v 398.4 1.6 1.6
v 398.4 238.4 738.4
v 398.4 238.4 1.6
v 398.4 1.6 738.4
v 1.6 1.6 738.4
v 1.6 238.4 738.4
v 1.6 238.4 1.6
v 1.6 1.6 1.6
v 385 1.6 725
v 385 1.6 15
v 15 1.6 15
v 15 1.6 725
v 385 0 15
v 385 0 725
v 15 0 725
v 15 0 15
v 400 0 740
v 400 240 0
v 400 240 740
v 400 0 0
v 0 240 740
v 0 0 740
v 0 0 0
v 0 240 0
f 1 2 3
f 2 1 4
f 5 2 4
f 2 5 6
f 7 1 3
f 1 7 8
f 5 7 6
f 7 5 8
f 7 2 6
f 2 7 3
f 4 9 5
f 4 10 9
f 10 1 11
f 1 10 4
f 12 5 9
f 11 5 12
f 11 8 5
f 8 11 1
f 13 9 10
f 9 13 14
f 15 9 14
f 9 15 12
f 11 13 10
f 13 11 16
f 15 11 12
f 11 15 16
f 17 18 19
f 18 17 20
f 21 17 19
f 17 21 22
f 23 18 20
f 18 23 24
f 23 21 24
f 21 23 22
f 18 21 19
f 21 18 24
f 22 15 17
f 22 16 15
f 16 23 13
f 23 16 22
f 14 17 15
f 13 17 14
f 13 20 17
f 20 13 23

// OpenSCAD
//Cabinet Dimensions
//0: width 1: depth, 2:height, 3:thickness,4:left margin,5:right margin,6:top margin,7:bottom margin
cabinet();

module cabinet(w=400,d=240,h=740,t=1.6,lm=15,rm=15,tm=15,bm=15){
    difference(){
        cube([w,d,h]);
        union(){
            //inside
            translate([t,t,t]) cube([w-2*t,d-2*t,h-2*t]);
            //door opening
            translate([lm,-t,bm]) 
            cube([w-lm-rm,2*t,h-tm-bm]);
        }
    }
}
